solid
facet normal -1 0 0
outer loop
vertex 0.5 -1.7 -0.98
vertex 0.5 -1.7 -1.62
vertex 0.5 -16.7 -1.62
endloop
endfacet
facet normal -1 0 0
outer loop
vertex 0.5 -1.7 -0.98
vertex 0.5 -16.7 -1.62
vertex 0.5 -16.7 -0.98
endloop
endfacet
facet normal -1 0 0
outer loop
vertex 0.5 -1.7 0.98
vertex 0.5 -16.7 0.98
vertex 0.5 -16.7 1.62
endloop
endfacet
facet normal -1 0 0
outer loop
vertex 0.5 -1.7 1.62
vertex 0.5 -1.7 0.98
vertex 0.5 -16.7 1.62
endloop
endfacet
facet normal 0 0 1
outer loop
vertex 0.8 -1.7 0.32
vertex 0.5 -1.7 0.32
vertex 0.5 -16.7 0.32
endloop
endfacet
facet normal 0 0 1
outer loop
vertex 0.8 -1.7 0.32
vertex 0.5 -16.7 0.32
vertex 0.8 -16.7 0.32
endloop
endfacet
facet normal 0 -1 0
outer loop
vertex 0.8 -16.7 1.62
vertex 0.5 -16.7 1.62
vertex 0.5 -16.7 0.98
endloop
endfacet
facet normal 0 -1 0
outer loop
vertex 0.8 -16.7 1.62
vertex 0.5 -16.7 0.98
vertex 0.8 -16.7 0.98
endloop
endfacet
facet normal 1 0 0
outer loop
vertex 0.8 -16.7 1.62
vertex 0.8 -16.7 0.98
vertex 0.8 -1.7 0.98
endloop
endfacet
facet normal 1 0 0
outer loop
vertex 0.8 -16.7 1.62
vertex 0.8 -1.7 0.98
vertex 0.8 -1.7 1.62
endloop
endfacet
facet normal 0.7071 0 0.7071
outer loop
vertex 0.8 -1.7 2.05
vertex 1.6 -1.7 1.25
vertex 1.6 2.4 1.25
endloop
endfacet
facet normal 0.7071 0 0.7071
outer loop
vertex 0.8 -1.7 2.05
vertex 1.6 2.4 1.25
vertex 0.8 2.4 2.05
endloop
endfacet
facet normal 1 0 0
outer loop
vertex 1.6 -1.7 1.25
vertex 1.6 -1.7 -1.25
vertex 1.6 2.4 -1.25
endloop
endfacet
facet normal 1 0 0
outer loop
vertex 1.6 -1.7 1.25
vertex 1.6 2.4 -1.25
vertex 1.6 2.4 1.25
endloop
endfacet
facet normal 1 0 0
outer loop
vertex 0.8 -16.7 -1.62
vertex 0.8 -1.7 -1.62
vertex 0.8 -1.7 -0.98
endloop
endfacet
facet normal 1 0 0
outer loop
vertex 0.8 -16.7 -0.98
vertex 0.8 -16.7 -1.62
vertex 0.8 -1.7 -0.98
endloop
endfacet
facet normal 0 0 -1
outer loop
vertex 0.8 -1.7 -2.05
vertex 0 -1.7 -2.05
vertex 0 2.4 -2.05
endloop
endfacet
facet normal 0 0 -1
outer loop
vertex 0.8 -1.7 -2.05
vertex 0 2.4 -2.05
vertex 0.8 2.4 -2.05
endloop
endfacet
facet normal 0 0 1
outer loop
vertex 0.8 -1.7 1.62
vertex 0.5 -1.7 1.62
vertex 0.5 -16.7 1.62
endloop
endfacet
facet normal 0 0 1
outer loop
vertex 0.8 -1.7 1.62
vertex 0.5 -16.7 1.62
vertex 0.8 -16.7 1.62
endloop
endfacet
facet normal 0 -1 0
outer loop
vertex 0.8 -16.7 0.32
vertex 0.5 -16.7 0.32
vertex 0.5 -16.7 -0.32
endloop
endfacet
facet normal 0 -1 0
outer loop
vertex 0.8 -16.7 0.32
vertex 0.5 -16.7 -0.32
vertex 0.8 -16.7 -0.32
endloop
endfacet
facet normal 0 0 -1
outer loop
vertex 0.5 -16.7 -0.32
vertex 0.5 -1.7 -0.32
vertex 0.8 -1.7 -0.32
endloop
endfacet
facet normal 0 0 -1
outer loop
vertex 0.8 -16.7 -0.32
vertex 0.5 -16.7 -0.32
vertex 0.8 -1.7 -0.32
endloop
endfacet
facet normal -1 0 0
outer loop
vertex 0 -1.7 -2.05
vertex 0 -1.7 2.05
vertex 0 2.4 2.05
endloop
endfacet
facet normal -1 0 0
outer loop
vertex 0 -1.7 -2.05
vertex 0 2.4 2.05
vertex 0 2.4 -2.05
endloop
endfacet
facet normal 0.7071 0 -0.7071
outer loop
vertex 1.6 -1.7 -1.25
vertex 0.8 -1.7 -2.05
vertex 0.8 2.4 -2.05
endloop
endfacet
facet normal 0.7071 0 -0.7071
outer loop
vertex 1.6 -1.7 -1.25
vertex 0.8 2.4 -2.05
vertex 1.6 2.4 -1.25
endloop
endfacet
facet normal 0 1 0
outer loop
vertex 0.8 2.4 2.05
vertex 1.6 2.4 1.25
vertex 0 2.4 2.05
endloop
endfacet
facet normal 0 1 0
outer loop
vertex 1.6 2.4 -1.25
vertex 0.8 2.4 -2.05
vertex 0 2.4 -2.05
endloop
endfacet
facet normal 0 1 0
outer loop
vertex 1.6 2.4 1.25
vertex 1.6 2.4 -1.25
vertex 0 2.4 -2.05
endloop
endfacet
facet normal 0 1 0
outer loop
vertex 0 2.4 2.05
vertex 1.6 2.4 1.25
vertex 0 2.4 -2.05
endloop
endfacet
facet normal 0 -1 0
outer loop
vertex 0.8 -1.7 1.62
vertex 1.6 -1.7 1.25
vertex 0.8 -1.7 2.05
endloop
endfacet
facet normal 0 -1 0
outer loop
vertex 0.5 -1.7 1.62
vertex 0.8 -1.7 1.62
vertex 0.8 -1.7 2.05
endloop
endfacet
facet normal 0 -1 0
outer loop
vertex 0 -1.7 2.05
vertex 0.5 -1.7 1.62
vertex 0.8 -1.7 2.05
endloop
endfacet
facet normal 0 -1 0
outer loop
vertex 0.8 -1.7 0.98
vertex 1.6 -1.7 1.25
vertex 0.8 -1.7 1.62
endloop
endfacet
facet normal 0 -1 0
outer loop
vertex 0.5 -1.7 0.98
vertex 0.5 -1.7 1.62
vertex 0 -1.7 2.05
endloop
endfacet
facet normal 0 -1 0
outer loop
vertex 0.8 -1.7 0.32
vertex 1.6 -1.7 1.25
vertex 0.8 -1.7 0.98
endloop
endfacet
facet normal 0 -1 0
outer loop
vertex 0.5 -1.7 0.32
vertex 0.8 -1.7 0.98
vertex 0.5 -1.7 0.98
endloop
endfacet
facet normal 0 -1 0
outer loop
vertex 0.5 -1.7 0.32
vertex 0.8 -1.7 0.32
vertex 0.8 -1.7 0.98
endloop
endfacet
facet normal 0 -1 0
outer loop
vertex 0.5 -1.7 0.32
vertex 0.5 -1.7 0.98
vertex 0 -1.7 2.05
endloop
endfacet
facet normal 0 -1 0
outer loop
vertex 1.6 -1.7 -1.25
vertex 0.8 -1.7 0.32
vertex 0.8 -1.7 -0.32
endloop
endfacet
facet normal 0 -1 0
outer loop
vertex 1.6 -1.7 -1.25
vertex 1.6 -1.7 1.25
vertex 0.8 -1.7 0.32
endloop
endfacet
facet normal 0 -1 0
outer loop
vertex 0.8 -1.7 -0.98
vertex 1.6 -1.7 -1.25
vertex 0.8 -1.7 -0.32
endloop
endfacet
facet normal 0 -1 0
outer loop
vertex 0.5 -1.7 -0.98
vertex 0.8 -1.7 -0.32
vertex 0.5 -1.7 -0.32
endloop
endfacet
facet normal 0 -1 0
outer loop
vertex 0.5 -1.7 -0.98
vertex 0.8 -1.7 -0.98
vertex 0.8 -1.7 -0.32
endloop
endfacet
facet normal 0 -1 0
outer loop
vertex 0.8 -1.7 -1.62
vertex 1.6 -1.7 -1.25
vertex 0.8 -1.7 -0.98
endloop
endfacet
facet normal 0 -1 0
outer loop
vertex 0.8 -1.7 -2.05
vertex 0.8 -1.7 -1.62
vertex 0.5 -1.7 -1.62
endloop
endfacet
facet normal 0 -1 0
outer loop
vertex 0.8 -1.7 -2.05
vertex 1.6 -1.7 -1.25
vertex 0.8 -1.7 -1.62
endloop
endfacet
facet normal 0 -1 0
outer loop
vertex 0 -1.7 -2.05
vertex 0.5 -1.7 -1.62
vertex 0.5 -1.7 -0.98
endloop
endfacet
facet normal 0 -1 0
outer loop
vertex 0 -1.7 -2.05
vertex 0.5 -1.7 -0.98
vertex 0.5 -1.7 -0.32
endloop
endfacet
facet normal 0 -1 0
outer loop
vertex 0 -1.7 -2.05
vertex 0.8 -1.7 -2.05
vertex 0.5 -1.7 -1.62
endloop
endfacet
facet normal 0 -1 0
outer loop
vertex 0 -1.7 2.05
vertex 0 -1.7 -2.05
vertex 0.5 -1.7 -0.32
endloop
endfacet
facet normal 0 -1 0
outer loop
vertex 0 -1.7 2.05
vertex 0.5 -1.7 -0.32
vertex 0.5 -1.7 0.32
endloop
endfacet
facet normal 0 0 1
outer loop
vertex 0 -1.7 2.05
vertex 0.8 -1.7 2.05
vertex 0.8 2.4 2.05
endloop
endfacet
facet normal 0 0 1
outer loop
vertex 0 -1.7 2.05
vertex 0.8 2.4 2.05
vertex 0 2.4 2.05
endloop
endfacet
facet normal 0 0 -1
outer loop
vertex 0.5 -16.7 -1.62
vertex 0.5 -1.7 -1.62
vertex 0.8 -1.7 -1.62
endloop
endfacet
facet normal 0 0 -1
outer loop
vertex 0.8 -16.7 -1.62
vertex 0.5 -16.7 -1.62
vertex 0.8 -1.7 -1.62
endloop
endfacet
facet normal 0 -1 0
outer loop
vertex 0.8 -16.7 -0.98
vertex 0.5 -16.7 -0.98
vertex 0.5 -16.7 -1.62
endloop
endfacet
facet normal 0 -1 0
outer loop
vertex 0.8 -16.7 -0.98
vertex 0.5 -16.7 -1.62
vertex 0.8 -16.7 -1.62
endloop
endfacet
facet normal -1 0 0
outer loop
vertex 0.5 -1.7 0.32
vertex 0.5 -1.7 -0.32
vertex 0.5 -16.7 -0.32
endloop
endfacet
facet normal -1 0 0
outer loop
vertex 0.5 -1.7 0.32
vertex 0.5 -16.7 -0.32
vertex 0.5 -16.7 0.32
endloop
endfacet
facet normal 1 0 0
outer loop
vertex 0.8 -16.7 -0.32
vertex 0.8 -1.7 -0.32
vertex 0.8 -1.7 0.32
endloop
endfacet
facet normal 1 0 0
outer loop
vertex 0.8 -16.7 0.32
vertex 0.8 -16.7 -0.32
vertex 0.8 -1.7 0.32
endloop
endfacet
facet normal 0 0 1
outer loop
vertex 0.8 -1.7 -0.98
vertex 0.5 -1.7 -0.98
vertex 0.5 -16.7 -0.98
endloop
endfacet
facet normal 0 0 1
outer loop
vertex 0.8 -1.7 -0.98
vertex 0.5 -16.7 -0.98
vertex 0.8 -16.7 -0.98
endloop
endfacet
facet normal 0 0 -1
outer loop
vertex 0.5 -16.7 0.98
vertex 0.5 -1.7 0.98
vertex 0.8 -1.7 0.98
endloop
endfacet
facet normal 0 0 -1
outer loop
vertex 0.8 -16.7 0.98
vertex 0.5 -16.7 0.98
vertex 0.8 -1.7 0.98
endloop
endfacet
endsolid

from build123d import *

# Parameters (mm, degrees)
BOSS_EXTRUDE3_DEPTH      = 2.4
BOSS_EXTRUDE3_DEPTH_BACK = 1.7
SKETCH5_W                = 0.3
SKETCH5_H                = 0.64
BOSS_EXTRUDE4_DEPTH      = 15


with BuildPart() as part:
    # Sketch4 → Boss-Extrude3 (new, two sides: drawn at the far end of the back side and taken through both)
    with BuildSketch(Plane(origin=(0, 0, 0), x_dir=(1, 0, 0), z_dir=(0, 1, 0)).offset(-BOSS_EXTRUDE3_DEPTH_BACK)):
        Polygon((0.8, 2.05), (1.6, 1.25), (1.6, -1.25), (0.8, -2.05), (0, -2.05), (0, 2.05), align=None)
    extrude(amount=BOSS_EXTRUDE3_DEPTH + BOSS_EXTRUDE3_DEPTH_BACK)

    # Sketch5 → Boss-Extrude4 (add)
    with BuildSketch(Plane.XZ.offset(1.7)):
        with Locations((0.65, 1.3)):
            Rectangle(SKETCH5_W, SKETCH5_H)
        with Locations((0.65, 0)):
            Rectangle(SKETCH5_W, SKETCH5_H)
        with Locations((0.65, -1.3)):
            Rectangle(SKETCH5_W, SKETCH5_H)
    extrude(amount=BOSS_EXTRUDE4_DEPTH)


solid = part.part
